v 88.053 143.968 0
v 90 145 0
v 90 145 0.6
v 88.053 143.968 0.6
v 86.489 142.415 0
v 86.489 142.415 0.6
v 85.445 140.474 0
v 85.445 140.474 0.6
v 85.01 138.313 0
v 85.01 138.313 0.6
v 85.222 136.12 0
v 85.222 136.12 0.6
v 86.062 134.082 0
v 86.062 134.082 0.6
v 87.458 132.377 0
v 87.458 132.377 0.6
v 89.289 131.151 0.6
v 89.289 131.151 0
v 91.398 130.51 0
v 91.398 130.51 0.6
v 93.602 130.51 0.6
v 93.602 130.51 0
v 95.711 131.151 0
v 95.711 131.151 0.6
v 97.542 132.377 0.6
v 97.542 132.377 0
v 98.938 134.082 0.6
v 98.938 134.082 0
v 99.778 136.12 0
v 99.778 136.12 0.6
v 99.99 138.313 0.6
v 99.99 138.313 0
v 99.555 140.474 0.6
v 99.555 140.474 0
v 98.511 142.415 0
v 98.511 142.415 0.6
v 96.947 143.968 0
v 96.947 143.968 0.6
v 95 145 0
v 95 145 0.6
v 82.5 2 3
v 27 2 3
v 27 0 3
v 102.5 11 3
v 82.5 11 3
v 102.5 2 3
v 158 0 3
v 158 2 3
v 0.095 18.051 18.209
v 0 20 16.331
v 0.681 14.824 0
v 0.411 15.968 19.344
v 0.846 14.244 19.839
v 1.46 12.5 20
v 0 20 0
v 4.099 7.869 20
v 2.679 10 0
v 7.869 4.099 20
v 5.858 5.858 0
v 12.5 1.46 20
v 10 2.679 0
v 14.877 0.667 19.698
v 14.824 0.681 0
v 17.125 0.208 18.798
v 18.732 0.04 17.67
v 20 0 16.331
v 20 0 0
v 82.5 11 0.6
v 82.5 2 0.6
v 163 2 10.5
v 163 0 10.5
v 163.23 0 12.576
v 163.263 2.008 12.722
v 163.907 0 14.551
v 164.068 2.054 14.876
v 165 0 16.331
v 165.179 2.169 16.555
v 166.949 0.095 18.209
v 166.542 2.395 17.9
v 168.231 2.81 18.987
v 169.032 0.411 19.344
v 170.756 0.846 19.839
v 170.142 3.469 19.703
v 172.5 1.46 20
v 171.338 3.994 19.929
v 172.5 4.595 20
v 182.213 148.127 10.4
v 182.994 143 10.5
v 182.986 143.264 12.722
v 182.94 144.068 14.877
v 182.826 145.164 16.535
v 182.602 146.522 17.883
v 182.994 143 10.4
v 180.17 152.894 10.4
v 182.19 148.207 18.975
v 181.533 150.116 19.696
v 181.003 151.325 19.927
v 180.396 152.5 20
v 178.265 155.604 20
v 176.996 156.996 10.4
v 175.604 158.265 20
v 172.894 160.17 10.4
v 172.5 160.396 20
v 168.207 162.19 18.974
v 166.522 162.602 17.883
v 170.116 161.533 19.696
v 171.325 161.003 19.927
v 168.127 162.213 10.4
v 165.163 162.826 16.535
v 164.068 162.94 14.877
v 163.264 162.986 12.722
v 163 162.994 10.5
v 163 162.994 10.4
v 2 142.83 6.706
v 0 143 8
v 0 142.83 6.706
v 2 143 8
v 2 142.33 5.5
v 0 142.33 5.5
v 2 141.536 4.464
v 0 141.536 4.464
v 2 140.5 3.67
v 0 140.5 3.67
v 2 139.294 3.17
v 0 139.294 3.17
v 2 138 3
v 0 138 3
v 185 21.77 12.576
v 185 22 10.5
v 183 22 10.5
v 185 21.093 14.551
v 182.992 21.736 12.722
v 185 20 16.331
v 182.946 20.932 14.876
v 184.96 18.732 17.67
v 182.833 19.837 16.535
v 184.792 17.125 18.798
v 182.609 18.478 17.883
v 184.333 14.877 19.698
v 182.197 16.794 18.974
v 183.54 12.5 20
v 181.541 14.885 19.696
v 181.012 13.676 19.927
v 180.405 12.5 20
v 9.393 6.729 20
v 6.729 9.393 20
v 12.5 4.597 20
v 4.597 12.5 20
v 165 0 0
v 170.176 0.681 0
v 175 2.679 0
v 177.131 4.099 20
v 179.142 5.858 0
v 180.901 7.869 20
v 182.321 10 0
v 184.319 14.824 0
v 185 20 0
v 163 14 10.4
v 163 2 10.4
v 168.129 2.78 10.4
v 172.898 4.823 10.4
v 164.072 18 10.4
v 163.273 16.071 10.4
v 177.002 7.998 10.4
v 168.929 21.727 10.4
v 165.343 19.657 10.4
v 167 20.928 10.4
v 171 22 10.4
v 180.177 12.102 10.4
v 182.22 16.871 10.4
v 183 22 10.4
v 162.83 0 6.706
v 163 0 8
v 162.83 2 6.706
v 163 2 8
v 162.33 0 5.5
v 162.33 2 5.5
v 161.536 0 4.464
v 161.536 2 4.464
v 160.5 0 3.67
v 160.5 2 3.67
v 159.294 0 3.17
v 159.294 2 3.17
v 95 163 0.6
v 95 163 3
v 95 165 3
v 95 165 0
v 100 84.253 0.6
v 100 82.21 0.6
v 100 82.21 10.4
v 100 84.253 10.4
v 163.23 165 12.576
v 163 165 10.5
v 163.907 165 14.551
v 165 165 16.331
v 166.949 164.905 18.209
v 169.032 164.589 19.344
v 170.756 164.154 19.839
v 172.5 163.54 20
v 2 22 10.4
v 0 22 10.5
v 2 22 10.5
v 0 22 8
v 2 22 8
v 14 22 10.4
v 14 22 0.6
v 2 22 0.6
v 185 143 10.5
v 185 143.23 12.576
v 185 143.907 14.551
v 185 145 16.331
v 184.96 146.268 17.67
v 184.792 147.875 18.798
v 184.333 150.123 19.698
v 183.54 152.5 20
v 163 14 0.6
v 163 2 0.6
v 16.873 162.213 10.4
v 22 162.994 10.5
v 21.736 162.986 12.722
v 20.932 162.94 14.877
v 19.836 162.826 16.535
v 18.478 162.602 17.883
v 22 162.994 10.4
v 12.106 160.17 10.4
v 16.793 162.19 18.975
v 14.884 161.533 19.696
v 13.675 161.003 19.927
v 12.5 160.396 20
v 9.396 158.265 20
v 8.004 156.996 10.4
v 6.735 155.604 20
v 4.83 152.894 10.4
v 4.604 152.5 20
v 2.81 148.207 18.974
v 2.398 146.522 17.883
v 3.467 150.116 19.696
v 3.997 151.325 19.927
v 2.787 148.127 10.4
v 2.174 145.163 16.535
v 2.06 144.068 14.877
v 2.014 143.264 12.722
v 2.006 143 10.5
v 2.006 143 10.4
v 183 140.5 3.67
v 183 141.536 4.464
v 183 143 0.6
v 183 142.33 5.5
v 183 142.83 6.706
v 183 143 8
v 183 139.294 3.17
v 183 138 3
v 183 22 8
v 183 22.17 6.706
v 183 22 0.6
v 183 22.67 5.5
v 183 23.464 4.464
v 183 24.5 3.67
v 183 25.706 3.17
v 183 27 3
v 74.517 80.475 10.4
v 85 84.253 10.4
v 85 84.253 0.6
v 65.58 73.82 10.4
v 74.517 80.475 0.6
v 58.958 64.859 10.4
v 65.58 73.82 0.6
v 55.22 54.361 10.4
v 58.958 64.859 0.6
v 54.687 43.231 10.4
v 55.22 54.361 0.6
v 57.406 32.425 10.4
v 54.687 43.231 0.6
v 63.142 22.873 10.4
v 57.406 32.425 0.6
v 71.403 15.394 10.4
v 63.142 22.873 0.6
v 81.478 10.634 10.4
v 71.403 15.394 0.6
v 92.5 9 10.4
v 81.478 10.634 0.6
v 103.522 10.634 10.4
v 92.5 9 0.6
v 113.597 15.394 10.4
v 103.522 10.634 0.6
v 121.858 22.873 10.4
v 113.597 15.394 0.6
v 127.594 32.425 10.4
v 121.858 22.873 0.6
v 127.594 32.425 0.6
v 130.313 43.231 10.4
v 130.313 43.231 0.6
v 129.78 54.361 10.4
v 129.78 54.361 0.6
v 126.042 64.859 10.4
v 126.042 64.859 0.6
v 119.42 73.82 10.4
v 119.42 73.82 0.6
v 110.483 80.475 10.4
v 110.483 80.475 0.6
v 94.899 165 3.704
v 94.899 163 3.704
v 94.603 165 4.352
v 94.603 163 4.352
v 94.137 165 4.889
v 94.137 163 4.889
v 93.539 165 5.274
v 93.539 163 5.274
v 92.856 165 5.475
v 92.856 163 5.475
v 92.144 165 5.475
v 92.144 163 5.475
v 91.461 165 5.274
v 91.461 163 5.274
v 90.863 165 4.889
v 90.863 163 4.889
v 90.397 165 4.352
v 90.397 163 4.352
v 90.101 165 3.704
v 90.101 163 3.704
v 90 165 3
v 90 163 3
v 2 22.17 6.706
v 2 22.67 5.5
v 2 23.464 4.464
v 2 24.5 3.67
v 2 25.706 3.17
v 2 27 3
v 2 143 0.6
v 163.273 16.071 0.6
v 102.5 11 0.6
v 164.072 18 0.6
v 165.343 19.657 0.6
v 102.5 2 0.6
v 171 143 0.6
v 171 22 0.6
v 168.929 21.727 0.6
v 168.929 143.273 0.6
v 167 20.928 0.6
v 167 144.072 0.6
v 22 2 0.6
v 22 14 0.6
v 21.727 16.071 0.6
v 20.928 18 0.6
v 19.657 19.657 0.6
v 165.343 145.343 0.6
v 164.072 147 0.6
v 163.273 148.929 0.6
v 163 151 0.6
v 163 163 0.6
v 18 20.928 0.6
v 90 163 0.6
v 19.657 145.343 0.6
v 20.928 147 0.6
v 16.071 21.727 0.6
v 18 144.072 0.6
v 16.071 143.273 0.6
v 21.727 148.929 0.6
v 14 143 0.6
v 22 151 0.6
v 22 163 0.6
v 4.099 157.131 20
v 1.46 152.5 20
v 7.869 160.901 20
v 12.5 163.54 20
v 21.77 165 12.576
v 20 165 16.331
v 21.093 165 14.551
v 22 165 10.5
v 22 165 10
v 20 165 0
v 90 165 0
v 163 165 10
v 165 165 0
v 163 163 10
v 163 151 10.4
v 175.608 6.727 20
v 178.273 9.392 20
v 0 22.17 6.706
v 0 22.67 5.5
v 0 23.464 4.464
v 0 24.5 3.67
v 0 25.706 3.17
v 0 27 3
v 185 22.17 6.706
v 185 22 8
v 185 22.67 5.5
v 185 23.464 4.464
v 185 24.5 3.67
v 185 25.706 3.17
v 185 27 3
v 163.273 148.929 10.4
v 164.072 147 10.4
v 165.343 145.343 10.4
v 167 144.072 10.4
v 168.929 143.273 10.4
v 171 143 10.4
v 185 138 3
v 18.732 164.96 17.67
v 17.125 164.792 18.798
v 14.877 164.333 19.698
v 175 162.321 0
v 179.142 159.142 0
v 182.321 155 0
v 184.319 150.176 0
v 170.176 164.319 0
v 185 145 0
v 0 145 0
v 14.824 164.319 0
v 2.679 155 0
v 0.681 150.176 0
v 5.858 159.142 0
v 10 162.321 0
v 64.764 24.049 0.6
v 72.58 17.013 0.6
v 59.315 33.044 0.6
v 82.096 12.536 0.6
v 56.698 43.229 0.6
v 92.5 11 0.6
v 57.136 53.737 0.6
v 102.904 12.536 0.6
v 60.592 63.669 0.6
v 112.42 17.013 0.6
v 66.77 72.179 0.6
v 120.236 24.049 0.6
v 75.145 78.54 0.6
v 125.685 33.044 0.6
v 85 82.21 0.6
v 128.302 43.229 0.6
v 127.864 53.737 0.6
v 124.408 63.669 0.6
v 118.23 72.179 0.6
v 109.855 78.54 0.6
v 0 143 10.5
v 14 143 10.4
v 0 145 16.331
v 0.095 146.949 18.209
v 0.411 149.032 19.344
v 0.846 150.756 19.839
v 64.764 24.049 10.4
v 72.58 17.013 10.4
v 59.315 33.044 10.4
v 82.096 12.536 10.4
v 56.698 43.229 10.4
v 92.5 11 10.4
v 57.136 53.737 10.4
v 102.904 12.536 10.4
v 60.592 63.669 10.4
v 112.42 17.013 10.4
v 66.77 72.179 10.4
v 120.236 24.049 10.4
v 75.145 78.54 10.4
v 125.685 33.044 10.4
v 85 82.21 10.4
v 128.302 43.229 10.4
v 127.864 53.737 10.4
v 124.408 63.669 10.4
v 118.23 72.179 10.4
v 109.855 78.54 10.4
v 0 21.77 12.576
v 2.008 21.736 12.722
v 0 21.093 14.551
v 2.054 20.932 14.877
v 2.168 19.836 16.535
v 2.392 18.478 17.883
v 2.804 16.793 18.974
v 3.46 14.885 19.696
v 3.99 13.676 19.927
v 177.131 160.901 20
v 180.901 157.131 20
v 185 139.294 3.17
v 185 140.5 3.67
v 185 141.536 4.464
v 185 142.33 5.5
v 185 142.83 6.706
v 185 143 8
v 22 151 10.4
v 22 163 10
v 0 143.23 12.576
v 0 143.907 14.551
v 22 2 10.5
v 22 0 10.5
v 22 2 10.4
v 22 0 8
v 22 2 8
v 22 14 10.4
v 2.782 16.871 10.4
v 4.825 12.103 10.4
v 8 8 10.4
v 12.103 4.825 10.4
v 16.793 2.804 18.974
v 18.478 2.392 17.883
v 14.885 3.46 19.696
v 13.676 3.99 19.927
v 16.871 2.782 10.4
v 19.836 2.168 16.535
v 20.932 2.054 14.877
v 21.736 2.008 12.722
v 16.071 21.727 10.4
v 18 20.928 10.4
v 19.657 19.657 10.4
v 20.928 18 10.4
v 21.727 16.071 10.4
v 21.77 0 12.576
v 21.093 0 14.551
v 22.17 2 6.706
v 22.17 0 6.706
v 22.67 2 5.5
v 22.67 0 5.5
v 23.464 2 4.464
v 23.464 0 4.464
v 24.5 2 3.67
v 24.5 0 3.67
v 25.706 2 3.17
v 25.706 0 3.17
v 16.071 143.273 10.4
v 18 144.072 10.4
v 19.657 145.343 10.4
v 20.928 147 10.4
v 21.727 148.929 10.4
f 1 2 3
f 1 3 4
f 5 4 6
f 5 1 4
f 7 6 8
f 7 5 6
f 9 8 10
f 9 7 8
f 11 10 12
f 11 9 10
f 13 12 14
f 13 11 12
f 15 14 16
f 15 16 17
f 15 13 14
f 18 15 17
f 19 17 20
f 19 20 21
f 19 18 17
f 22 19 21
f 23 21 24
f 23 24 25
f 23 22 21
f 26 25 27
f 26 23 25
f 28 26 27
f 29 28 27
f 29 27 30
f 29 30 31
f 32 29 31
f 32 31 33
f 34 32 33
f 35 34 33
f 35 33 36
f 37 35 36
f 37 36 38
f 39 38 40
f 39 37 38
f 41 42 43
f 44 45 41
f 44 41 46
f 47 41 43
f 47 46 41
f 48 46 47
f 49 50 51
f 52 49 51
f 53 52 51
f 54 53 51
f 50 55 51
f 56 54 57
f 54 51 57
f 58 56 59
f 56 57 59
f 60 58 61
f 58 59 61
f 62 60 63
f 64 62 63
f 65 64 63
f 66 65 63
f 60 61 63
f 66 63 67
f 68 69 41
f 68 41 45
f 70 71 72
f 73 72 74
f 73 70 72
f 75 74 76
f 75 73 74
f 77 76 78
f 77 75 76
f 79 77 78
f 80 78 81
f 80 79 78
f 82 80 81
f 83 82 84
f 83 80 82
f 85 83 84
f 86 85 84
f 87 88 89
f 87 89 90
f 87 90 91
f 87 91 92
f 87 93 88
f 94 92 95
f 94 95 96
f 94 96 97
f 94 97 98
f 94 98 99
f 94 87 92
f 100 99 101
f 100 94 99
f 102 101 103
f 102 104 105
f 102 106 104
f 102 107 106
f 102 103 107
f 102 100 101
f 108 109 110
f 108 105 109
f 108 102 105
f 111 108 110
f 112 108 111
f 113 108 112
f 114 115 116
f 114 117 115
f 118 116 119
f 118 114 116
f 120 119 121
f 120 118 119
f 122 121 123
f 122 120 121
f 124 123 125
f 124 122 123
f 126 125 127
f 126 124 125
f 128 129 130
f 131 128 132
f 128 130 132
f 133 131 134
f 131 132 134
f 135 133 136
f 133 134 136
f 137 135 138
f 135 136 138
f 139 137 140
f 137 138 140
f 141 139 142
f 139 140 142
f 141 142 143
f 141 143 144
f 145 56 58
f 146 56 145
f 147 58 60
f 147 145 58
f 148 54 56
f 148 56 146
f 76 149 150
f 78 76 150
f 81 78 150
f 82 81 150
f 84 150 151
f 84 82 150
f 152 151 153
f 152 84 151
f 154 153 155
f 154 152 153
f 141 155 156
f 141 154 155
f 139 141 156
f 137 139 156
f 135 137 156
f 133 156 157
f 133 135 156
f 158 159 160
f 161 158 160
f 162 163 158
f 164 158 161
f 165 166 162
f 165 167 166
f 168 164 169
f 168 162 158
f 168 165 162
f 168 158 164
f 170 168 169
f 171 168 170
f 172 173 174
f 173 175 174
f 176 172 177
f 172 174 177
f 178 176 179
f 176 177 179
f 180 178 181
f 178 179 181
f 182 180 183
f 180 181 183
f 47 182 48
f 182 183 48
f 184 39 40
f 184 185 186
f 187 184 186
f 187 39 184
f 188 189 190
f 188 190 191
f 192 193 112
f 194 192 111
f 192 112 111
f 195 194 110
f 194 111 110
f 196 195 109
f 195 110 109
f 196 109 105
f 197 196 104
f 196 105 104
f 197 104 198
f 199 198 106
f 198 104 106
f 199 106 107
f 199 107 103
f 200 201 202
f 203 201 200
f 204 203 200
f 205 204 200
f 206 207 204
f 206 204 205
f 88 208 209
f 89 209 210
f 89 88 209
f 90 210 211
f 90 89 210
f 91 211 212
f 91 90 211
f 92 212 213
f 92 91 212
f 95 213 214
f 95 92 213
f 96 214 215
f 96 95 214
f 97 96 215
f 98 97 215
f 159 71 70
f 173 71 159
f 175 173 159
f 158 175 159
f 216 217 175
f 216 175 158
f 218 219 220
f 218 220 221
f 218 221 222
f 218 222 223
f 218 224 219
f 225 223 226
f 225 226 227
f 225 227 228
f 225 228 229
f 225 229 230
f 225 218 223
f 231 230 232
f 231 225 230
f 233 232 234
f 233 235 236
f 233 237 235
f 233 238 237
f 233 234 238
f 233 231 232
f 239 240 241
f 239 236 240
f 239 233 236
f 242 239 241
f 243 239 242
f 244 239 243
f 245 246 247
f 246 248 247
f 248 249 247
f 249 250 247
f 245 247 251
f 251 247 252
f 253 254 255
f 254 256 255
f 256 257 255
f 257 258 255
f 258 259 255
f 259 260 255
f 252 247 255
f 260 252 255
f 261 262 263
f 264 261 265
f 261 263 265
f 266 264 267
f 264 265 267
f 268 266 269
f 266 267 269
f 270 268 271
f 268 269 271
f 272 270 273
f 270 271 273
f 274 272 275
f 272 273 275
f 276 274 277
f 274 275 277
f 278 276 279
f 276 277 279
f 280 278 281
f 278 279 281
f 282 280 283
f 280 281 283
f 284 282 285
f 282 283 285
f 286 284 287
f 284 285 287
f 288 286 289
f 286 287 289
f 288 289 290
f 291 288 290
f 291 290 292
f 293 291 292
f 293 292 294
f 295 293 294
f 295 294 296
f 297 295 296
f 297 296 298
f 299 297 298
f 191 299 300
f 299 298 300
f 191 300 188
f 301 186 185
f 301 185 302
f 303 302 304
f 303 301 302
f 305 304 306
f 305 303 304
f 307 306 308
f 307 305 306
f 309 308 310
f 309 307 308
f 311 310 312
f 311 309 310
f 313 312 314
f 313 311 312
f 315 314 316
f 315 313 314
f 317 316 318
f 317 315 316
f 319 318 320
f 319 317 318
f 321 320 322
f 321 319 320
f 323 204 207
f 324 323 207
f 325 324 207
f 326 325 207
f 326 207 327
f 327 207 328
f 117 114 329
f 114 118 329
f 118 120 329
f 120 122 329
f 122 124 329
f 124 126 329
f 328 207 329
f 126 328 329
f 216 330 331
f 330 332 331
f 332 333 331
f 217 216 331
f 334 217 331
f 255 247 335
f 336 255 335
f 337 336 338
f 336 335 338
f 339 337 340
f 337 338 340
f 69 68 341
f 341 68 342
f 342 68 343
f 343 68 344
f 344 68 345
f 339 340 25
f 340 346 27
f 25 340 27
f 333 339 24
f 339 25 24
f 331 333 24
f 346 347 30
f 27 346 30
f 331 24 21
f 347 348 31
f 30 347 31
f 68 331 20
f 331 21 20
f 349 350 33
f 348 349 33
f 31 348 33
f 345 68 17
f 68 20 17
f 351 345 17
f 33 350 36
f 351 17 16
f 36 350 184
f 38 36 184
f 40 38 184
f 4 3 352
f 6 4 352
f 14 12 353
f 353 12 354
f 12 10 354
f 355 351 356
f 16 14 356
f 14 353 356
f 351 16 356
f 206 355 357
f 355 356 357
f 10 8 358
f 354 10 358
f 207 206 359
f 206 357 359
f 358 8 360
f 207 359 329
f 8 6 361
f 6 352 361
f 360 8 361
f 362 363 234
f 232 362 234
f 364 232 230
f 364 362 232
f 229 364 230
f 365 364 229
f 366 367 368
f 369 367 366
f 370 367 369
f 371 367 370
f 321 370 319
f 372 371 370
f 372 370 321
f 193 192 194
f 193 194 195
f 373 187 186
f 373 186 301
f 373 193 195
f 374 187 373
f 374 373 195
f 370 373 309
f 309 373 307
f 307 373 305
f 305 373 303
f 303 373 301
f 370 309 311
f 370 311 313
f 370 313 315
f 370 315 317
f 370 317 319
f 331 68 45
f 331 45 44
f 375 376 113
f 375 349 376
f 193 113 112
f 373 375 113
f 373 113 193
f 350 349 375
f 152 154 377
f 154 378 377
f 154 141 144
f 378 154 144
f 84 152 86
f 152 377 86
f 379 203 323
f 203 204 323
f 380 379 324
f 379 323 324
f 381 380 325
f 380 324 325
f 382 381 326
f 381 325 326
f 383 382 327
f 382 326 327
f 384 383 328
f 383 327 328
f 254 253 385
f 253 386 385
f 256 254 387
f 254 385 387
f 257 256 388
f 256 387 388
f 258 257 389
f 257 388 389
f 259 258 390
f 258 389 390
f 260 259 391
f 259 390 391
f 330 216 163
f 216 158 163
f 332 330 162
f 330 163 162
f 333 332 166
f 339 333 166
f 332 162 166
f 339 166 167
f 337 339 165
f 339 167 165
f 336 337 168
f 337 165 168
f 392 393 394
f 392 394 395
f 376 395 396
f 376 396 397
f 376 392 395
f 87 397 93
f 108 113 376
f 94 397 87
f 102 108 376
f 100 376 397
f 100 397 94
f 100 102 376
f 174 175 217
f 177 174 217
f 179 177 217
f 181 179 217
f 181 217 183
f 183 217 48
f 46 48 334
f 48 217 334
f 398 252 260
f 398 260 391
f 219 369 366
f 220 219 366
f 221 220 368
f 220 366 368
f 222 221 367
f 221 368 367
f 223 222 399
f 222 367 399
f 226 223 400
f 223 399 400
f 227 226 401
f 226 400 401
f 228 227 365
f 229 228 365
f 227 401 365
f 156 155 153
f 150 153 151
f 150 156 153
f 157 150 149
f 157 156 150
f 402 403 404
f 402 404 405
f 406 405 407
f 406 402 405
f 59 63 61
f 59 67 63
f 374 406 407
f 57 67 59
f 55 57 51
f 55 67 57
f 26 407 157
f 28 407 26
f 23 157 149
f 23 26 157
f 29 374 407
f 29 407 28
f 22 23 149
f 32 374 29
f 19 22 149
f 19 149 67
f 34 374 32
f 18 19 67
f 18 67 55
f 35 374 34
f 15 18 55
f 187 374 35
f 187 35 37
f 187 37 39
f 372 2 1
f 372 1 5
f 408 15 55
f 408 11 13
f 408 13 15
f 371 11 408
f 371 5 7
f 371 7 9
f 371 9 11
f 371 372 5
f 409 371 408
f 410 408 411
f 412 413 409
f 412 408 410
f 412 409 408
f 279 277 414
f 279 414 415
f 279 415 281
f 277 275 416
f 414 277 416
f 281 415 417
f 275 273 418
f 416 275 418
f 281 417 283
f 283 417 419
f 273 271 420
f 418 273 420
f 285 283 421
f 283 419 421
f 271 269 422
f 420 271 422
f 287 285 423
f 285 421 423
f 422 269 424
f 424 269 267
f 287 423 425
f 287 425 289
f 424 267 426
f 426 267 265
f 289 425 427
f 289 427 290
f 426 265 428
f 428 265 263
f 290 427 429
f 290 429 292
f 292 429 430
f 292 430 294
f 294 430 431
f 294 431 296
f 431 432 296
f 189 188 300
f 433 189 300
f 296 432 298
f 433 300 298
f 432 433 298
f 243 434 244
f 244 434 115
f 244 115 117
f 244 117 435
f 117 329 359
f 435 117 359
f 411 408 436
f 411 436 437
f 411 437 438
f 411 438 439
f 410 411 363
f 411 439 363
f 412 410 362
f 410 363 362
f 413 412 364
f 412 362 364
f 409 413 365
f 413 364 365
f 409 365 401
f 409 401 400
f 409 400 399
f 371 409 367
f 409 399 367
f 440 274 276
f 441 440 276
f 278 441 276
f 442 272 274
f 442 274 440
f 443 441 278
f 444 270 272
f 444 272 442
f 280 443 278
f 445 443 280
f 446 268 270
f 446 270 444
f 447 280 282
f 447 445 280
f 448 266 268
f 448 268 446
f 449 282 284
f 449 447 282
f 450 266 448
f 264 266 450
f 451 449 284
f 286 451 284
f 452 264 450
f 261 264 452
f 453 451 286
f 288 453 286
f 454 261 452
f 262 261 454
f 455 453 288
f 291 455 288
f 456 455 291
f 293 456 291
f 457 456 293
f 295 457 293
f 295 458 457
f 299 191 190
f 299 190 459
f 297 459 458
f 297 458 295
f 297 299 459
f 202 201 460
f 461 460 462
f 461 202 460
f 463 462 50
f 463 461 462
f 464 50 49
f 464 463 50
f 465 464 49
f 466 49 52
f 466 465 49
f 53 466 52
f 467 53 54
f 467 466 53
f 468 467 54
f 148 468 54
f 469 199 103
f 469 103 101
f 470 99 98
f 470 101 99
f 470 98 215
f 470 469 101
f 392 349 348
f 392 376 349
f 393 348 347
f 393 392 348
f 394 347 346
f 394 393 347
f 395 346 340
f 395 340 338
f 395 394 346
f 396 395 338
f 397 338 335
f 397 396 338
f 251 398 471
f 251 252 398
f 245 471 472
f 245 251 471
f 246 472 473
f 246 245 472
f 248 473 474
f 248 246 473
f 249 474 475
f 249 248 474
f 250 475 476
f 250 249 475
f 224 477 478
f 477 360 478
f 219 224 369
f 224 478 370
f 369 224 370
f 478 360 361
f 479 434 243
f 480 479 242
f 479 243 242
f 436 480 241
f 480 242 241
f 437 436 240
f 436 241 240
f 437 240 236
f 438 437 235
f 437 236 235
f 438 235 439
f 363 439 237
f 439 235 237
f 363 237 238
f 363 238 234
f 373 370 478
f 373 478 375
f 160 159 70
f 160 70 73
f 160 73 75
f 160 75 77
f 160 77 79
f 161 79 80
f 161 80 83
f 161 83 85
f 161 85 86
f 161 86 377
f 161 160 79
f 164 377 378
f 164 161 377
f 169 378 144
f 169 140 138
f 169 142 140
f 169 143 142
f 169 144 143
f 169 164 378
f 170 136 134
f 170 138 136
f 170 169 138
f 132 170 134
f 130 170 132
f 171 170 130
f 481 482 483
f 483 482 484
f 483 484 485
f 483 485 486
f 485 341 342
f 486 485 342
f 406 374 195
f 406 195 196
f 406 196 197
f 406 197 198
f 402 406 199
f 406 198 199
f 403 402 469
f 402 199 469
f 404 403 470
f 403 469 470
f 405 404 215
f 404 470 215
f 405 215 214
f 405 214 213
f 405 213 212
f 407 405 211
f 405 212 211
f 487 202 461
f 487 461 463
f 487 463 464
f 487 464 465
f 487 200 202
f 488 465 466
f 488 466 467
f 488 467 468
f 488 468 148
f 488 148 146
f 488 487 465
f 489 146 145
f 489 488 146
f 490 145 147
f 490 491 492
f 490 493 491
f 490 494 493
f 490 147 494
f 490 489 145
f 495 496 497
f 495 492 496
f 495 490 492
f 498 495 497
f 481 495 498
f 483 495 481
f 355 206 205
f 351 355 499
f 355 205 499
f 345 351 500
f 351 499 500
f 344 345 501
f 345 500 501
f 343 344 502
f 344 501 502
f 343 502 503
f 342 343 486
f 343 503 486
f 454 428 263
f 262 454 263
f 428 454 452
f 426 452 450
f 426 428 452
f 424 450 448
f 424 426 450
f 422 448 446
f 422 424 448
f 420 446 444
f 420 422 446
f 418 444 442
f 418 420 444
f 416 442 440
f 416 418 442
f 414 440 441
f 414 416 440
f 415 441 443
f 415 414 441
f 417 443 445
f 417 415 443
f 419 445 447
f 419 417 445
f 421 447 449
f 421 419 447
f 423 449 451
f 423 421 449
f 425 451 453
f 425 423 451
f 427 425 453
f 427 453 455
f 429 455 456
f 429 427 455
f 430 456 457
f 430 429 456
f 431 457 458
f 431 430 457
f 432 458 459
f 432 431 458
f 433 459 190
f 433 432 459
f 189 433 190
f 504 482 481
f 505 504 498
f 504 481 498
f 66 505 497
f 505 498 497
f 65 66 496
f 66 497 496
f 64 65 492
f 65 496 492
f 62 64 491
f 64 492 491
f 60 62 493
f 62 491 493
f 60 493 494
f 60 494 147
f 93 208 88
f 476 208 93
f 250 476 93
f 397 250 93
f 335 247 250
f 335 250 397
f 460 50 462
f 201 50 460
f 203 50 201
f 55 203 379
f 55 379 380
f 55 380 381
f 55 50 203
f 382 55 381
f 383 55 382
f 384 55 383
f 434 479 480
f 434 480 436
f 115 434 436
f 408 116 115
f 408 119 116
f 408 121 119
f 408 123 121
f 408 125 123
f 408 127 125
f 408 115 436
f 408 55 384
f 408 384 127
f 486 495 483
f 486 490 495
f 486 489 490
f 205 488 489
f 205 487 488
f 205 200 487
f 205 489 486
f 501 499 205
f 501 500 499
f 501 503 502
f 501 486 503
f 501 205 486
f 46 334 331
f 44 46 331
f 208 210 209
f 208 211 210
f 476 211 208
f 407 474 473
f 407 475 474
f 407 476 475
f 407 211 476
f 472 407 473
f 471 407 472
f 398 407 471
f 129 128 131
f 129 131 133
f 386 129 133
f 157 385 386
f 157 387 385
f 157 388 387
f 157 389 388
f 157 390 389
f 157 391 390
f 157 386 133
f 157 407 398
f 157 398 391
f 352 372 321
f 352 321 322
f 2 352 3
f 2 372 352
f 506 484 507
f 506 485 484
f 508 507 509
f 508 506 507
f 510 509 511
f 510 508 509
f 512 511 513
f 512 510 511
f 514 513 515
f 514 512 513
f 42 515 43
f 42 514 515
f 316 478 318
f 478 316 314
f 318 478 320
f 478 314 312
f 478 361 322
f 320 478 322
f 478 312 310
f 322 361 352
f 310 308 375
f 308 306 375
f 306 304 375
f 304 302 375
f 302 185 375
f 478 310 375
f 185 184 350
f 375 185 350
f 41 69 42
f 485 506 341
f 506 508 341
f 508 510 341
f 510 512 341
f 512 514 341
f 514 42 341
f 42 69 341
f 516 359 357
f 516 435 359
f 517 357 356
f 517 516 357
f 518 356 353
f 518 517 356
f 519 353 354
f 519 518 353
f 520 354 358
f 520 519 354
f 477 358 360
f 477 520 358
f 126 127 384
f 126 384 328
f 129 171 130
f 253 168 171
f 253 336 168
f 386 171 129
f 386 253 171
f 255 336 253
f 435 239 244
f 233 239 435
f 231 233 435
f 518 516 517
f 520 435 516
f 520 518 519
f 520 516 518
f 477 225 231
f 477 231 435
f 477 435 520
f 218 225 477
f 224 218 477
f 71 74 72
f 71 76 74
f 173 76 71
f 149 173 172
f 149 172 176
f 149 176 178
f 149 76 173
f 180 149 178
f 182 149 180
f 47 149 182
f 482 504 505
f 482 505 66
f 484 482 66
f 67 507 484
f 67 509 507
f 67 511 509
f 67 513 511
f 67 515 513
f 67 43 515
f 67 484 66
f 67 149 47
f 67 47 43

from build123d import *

# Parameters (mm, degrees)
BOX_W               = 15
BOX_H               = 10
BOX_DEPTH           = 10
SKETCH002_R         = 38
SKETCH002_R_2       = 36
PAD001_DEPTH        = 9.8
BOX002_W            = 5
BOX002_H            = 5
BOX002_DEPTH        = 3
CYLINDER_R          = 2.5
CYLINDER_DEPTH      = 5
CYLINDER_ROLL_ANGLE = 90
PAD005_DEPTH        = 0.6
PAD004_DEPTH        = 20
SKETCH003_W         = 22
SKETCH003_H         = 22
PAD003_DEPTH        = 10.4
PAD_DEPTH           = 3
BOX001_W            = 141
BOX001_H            = 2
BOX001_DEPTH        = 10
SKETCH006_W         = 20
SKETCH006_H         = 11
PAD006_DEPTH        = 3
FILLET_R            = 5
FILLET001_R         = 9.5
FILLET002_R         = 20
FILLET003_R         = 8


with BuildPart() as usb_connection:
    # Box → Box (new body)
    with BuildSketch(Plane(origin=(85, 80, 0.6), x_dir=(1, 0, 0), z_dir=(0, 0, 1))):
        with Locations((7.5, 5)):
            Rectangle(BOX_W, BOX_H)
    extrude(amount=BOX_DEPTH)


with BuildPart() as cut:
    # Sketch002 → Pad001 (new body)
    with BuildSketch(Plane.XY.offset(0.6)):
        with Locations((92.5, 47)):
            Circle(SKETCH002_R)
        with Locations((92.5, 47)):
            Circle(SKETCH002_R_2, mode=Mode.SUBTRACT)
    extrude(amount=PAD001_DEPTH)

    # Cut: cut USB_CONNECTION
    add(usb_connection.part, mode=Mode.SUBTRACT)


with BuildPart() as w_rfel001:
    # Box002 → Box002 (new body)
    with BuildSketch(Plane(origin=(90, 162, 0), x_dir=(1, 0, 0), z_dir=(0, 0, 1))):
        with Locations((2.5, 2.5)):
            Rectangle(BOX002_W, BOX002_H)
    extrude(amount=BOX002_DEPTH)


with BuildPart() as zylinder:
    # Cylinder → Cylinder (new body)
    with BuildSketch(Plane.XY):
        Circle(CYLINDER_R)
    extrude(amount=CYLINDER_DEPTH)


with BuildPart() as zylinder_1:
    # Cylinder roll: moved
    add(zylinder.part.rotate(Axis((0, 0, 0), (1, 0, 0)), CYLINDER_ROLL_ANGLE))


with BuildPart() as zylinder_2:
    # Cylinder placement: moved
    add(zylinder_1.part.moved(Location((92.5, 166, 3))))


with BuildPart() as pad005:
    # Sketch005 → Pad005 (new body)
    with BuildSketch(Plane.XY):
        with BuildLine():
            Line((185, 165), (185, 0))
            Line((185, 0), (0, 0))
            Line((0, 0), (0, 165))
            Line((0, 165), (90, 165))
            Line((90, 165), (90, 145))
            ThreePointArc((90, 145), (92.5, 130.428932), (95, 145))
            Line((95, 165), (95, 145))
            Line((185, 165), (95, 165))
        make_face()
    extrude(amount=PAD005_DEPTH)


with BuildPart() as pad004:
    # Sketch004 → Pad004 (new body)
    with BuildSketch(Plane.XY):
        with BuildLine():
            Line((0, 165), (0, 143))
            Line((0, 143), (2.006098, 143))
            ThreePointArc((22, 162.993902), (8.004311, 156.995689), (2.006098, 143))
            Line((22, 162.993902), (22, 165))
            Line((0, 165), (22, 165))
        make_face()
        with BuildLine():
            Line((185, 165), (163, 165))
            Line((163, 165), (163, 162.993902))
            ThreePointArc((182.993902, 143), (176.995689, 156.995689), (163, 162.993902))
            Line((185, 143), (182.993902, 143))
            Line((185, 165), (185, 143))
        make_face()
        with BuildLine():
            Line((185, 22), (185, 0))
            Line((185, 0), (163, 0))
            Line((163, 0), (163, 2))
            ThreePointArc((163, 2), (177.001643, 7.998357), (183, 22))
            Line((185, 22), (183, 22))
        make_face()
        with BuildLine():
            Line((0, 0), (22, 0))
            Line((22, 0), (22, 2))
            ThreePointArc((2, 22), (8, 8), (22, 2))
            Line((0, 22), (2, 22))
            Line((0, 0), (0, 22))
        make_face()
    extrude(amount=PAD004_DEPTH)


with BuildPart() as pad003:
    # Sketch003 → Pad003 (new body)
    with BuildSketch(Plane.XY):
        with Locations((11, 154)):
            Rectangle(SKETCH003_W, SKETCH003_H)
        with Locations((174, 154)):
            Rectangle(SKETCH003_W, SKETCH003_H)
        with Locations((174, 11)):
            Rectangle(SKETCH003_W, SKETCH003_H)
        with Locations((11, 11)):
            Rectangle(SKETCH003_W, SKETCH003_H)
    extrude(amount=PAD003_DEPTH)


with BuildPart() as pad:
    # Sketch → Pad (new body)
    with BuildSketch(Plane.XY):
        Polygon((0, 0), (185, 0), (185, 165), (95, 165), (95, 163), (173, 163), (183, 153), (183, 12), (173, 2), (12, 2), (2, 12), (2, 153), (12, 163), (90, 163), (90, 165), (0, 165), align=None)
    extrude(amount=PAD_DEPTH)


with BuildPart() as w_rfel:
    # Box001 → Box001 (new body)
    with BuildSketch(Plane(origin=(22, 163, 0), x_dir=(1, 0, 0), z_dir=(0, 0, 1))):
        with Locations((70.5, 1)):
            Rectangle(BOX001_W, BOX001_H)
    extrude(amount=BOX001_DEPTH)


with BuildPart() as fillet003:
    # Sketch006 → Pad006 (new body)
    with BuildSketch(Plane.XY):
        with Locations((92.5, 5.5)):
            Rectangle(SKETCH006_W, SKETCH006_H)
    extrude(amount=PAD006_DEPTH)

    # Fusion: union Pad005, Pad004, Pad003, Pad, Würfel
    add(pad005.part)
    add(pad004.part)
    add(pad003.part)
    add(pad.part)
    add(w_rfel.part)

    # Cut001: cut Zylinder
    add(zylinder_2.part, mode=Mode.SUBTRACT)

    # Cut002: cut Würfel001
    add(w_rfel001.part, mode=Mode.SUBTRACT)

    # Fillet
    fillet_edges = [fillet003.edges().sort_by_distance(p)[0] for p in [
        (1, 143, 3),
        (1, 22, 3),
        (22, 1, 3),
        (163, 1, 3),
        (184, 22, 3),
        (184, 143, 3),
    ]]
    fillet(fillet_edges, radius=FILLET_R)

    # Fillet001
    fillet001_edges = [fillet003.edges().sort_by_distance(p)[0] for p in [
        (1, 22, 20),
        (22, 1, 20),
        (1.003049, 143, 20),
        (22, 163.996951, 20),
        (183.996951, 143, 20),
        (163, 163.996951, 20),
        (184, 22, 20),
        (163, 1, 20),
    ]]
    fillet(fillet001_edges, radius=FILLET001_R)

    # Fillet002
    fillet002_edges = [fillet003.edges().sort_by_distance(p)[0] for p in [
        (0, 0, 15.2),
        (185, 0, 15.2),
        (185, 165, 15.2),
        (0, 165, 15.2),
    ]]
    fillet(fillet002_edges, radius=FILLET002_R)

    # Fillet003
    fillet003_edges = [fillet003.edges().sort_by_distance(p)[0] for p in [
        (22, 143, 5.5),
        (163, 143, 5.5),
        (163, 22, 5.5),
        (22, 22, 5.5),
    ]]
    fillet(fillet003_edges, radius=FILLET003_R)


solid = Compound([cut.part, fillet003.part])
